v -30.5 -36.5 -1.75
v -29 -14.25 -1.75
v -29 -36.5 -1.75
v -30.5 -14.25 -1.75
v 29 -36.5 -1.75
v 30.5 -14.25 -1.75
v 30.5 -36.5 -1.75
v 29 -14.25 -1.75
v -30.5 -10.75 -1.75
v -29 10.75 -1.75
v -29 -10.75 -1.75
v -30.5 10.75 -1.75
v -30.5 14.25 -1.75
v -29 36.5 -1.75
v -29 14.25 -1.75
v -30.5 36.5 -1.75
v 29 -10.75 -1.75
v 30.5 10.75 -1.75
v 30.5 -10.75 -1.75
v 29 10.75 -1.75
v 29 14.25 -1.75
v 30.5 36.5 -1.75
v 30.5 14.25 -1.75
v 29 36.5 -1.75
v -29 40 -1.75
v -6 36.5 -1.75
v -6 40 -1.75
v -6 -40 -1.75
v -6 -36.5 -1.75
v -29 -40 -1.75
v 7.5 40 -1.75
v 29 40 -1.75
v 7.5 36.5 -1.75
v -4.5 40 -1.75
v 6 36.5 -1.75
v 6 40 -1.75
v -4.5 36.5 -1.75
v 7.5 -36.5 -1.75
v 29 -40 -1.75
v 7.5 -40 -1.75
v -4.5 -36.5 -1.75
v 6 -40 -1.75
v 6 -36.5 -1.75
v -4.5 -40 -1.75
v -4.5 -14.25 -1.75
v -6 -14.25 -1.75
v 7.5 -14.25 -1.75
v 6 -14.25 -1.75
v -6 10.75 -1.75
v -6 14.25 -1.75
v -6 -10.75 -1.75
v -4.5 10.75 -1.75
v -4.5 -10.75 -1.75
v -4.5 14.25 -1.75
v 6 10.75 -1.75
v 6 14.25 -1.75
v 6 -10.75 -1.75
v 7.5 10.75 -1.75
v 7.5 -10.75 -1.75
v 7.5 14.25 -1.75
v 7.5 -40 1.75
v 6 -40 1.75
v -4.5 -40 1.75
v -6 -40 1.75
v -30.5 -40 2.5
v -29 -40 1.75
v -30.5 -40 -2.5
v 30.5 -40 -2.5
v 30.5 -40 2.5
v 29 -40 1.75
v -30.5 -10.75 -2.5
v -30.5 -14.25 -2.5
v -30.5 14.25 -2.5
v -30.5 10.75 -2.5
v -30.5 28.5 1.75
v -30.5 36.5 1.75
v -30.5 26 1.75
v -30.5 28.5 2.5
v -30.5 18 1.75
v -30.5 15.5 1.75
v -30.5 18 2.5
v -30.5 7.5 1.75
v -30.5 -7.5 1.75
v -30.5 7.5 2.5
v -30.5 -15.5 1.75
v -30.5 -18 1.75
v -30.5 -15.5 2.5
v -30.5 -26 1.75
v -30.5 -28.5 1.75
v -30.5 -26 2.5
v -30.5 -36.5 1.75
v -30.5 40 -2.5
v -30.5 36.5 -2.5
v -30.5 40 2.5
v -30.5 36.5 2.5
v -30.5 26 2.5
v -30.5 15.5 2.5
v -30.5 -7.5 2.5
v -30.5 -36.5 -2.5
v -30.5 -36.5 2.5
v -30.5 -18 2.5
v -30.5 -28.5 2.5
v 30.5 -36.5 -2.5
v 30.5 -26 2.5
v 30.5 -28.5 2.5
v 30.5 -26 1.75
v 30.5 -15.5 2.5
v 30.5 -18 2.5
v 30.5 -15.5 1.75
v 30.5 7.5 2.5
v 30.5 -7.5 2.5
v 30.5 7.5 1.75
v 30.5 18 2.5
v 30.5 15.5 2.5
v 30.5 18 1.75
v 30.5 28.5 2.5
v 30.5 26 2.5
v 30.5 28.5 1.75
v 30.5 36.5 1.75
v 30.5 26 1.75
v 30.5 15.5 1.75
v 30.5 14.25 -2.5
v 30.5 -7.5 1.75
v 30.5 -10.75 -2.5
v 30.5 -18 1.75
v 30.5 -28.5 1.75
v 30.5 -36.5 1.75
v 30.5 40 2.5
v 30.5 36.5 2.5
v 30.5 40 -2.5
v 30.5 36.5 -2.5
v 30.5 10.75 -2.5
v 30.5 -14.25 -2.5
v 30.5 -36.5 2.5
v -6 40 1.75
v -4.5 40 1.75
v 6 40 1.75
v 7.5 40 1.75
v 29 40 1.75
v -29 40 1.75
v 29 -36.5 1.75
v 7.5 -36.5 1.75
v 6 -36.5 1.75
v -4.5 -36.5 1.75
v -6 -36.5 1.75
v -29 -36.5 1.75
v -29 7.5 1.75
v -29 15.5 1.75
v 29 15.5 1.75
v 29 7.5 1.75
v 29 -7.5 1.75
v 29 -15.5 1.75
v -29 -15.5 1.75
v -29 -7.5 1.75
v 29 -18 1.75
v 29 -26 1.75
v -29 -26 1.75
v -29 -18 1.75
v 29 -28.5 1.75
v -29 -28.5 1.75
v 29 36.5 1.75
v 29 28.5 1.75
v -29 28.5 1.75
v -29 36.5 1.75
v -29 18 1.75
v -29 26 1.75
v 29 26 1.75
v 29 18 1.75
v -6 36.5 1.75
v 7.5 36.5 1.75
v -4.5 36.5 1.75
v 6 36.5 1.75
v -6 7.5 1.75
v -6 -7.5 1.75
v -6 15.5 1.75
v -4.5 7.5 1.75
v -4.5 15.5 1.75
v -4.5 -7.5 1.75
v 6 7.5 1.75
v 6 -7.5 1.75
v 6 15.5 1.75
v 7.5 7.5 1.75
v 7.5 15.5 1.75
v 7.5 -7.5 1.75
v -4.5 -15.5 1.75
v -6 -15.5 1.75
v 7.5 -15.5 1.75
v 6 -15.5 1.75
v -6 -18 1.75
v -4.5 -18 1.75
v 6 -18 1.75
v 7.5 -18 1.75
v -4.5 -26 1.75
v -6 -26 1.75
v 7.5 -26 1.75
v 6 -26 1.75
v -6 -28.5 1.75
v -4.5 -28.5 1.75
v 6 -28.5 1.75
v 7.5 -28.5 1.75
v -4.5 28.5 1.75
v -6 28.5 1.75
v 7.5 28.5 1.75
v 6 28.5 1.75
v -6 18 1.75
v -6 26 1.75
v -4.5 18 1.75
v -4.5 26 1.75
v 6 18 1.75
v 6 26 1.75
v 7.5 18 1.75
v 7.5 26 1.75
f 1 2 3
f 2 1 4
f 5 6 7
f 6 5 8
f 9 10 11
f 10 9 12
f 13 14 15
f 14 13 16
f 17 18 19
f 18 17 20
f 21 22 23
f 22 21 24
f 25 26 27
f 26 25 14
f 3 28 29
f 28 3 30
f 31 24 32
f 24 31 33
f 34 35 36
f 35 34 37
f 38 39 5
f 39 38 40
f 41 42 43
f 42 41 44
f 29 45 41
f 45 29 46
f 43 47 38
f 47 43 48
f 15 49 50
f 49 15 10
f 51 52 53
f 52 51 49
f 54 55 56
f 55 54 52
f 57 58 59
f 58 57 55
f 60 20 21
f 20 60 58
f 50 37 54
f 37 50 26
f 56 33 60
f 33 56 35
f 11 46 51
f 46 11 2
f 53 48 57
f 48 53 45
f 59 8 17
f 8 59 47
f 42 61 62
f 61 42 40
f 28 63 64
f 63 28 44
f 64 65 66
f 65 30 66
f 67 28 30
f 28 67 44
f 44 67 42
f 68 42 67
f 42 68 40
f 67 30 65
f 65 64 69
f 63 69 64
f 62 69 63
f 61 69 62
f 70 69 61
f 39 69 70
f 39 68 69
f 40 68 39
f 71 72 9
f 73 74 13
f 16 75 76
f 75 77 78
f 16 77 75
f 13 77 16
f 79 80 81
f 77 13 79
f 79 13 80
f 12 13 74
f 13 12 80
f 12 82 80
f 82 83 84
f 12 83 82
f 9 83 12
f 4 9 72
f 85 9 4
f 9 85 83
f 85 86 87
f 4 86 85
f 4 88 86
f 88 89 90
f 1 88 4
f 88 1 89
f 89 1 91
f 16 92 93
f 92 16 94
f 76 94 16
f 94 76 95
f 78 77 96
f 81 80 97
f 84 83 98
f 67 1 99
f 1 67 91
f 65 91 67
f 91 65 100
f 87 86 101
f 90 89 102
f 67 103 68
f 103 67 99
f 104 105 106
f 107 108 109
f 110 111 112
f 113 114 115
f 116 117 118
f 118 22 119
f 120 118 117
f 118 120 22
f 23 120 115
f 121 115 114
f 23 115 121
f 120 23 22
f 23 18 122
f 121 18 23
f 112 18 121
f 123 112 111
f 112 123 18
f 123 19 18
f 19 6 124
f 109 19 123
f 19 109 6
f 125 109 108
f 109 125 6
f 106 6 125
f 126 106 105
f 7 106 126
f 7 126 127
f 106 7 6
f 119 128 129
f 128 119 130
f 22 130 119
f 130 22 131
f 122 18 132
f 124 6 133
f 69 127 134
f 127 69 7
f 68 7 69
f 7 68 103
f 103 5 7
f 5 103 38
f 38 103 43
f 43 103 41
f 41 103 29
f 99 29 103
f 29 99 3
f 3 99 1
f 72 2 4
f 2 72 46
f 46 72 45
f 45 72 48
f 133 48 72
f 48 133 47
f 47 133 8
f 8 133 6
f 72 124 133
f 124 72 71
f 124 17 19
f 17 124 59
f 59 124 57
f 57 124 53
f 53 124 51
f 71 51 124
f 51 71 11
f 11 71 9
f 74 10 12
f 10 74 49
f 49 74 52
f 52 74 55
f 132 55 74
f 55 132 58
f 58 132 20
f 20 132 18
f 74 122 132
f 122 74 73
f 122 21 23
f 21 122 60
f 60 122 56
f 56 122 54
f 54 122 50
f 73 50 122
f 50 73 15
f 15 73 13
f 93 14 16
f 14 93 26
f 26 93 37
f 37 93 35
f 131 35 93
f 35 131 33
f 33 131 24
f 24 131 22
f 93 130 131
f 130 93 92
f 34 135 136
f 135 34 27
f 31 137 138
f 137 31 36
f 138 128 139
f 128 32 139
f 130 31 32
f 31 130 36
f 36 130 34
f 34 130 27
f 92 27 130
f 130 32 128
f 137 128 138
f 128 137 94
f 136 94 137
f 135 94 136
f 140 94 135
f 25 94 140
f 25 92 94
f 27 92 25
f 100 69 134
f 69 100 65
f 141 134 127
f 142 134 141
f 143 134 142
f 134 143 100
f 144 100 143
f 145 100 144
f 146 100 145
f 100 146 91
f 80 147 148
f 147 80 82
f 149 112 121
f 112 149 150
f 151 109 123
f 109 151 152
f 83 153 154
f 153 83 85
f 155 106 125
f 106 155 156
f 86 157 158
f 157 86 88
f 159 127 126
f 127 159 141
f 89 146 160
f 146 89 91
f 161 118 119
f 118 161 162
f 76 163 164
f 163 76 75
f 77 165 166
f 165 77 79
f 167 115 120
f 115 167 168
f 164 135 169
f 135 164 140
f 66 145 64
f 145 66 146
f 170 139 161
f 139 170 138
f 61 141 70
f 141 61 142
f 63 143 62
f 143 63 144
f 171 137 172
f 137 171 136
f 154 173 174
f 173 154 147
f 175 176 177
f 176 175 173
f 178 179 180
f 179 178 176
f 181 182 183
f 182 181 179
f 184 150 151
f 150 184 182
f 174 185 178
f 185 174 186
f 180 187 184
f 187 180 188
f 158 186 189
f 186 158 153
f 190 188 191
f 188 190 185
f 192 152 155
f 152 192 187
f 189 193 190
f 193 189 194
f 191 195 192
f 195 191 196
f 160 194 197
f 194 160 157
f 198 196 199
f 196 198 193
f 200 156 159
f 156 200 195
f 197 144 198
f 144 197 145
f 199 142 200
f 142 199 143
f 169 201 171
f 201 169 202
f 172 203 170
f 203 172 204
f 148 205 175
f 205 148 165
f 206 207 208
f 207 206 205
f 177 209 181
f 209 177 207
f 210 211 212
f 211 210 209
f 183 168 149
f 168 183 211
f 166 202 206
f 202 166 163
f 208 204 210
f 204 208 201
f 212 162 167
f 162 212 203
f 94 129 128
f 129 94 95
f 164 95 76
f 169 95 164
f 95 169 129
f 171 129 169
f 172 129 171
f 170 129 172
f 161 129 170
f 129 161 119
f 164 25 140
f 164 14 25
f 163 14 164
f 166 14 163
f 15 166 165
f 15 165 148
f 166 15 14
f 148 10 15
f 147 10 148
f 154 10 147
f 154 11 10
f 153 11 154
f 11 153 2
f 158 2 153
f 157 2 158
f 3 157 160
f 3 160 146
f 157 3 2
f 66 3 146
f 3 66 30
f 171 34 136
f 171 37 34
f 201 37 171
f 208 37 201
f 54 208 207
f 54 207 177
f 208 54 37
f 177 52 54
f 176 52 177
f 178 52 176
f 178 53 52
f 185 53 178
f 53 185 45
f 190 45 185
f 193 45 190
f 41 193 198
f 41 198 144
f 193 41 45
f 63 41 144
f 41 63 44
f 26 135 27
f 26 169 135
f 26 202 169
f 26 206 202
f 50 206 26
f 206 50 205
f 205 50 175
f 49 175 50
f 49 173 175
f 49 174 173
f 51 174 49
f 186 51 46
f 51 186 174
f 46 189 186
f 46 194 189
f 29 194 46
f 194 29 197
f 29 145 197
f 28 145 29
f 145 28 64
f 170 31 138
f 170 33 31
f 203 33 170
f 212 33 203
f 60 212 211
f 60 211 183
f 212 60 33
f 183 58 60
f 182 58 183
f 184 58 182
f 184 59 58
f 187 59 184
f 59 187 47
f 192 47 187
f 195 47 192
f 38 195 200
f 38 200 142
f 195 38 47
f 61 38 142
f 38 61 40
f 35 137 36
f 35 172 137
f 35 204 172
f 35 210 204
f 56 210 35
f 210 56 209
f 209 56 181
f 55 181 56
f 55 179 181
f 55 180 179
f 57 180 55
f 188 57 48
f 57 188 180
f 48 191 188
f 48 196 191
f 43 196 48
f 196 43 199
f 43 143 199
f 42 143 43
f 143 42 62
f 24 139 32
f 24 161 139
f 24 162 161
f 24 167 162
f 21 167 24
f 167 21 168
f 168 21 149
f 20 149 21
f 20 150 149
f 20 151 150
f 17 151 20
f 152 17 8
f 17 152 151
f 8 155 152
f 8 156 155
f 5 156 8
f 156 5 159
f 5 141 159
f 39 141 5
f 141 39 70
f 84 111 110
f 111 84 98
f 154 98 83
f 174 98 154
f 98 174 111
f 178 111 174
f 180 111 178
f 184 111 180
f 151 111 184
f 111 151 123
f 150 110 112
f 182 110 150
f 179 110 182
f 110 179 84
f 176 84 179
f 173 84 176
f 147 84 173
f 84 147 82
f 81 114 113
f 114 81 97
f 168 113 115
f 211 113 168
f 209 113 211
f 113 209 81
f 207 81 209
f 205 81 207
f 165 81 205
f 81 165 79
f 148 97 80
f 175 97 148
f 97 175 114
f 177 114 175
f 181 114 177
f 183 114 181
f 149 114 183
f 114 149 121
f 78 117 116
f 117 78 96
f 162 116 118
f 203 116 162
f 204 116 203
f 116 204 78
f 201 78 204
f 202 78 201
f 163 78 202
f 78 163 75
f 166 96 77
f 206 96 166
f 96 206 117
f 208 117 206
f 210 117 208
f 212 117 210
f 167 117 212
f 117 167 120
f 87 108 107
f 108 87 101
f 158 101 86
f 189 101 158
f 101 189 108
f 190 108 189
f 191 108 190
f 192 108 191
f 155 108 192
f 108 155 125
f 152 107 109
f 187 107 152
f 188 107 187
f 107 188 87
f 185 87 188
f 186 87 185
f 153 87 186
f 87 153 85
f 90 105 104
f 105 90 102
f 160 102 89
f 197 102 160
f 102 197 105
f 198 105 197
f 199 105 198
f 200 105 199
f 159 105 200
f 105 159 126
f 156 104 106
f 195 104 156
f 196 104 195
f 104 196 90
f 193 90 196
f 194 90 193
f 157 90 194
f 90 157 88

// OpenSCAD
// file: materials.scad
// General Materials List for part Dimmentions
//  These form the matrial requirements for Deseret Manufacturing's homemade pallets

// Define Rails as 2x4 boards
Rails_W = 3.5; // 4
Rails_T = 1.5; // 2

// Define Frames as 1x4 boards
Frame_W = 3.5; // 4
Frame_T = 0.75; // 1

// Define Ties as 1x3 boards
Tie_W = 2.5; // 3
Tie_T = Frame_T; // same thickness as Frames

// These are the real sizes of the board and are used in calulations and rendering
// file: Pallet.scad
// Generic Pallet Module

include <materials.scad>

module Pallet(length, width, center) {
	// Define parts
	Rails = [Rails_W, length, Rails_T];
	Frame = [Frame_W, width, Frame_T];
	Tie = [Tie_W, width, Frame_T];

	// Place Foundation
	//  The end-to-end constant 29.25 is used because in the pallets I have made I can find no edge-cases that would need to alter it and I lack sufficient data on pallet jacks to automaticly place them.
	foundation_pos = [0, 29.25 - Frame_W, length - 29.25, length - Frame_W];

	for( pos = foundation_pos ) {
		rotate([0,0,90]) translate([pos - length / 2, - width / 2, - (Rails_W / 2) - Frame_T]) cube(Frame);
	}

	for( pos = [0, length - Frame_W] ) {
		rotate([0,0,90]) translate([pos - length / 2, - width / 2, Rails_W /2]) cube(Frame);
	}

	// Place Rails
	//  The end-to-end constant for the space between the two middle rails is 13.5
	//  Again I lack sufficient data on pallet jacks to automaticly place them.
	
	rail_spaces = (width - 13.5 + Rails_T) / 2;

	rail_pos = [0, rail_spaces, width - rail_spaces, width - Rails_T];

	for( pos = rail_pos ) {
		translate([pos - width /2 , -length /2 ,Rails_W /2]) rotate([0,90,0]) cube(Rails);
	}

	// Place Ties
	//  Ties form the main face of the pallet
   //  In this design, a centeral cluster of ties is used to reinforce the middle of the pallet
	pallet_center = length / 2;
	cluster_center = (center * Tie_W) / 2 + Tie_W;
	function cluster_pos_gen(ittr) = pallet_center - cluster_center + (ittr * Tie_W);
	cluster_pos = [ for(i=[1:center]) cluster_pos_gen(i) ];
    for( pos = cluster_pos ){
        rotate([0,0,90]) translate([pos - length / 2, - width / 2, Rails_W /2]) cube(Tie);
    }
    
    target_space = 8;
    tie_count = ceil((length - ( center * Tie_W + 2 * ( Frame_W + target_space ))) / (Tie_W + target_space ) / 2) * 2;
    tie_space = (length - ( center * Tie_W + 2 * Frame_W + tie_count * Tie_W )) / (tie_count + 2);
    echo(tie_count);
    echo(tie_space);
    for(i = [0:tie_count / 2 - 1] ) {
        rotate([0,0,90]) translate([i * (tie_space + Tie_W) + (center * Tie_W) / 2 + tie_space, - width / 2, Rails_W /2]) cube(Tie);
    }
     for(i = [0:tie_count / 2 - 1] ) {
        rotate([0,0,90]) translate([-(i * (tie_space + Tie_W) + (center * Tie_W) / 2 + tie_space) - Tie_W, - width / 2, Rails_W /2]) cube(Tie);
    }
}
// main file
// Implimentation of full sized pallets (designed to fit a full sized mattress).

use <Pallet.scad>

Pallet_L = 80;
Pallet_W = 61;
Center = 6;

Pallet(Pallet_L, Pallet_W, Center);
